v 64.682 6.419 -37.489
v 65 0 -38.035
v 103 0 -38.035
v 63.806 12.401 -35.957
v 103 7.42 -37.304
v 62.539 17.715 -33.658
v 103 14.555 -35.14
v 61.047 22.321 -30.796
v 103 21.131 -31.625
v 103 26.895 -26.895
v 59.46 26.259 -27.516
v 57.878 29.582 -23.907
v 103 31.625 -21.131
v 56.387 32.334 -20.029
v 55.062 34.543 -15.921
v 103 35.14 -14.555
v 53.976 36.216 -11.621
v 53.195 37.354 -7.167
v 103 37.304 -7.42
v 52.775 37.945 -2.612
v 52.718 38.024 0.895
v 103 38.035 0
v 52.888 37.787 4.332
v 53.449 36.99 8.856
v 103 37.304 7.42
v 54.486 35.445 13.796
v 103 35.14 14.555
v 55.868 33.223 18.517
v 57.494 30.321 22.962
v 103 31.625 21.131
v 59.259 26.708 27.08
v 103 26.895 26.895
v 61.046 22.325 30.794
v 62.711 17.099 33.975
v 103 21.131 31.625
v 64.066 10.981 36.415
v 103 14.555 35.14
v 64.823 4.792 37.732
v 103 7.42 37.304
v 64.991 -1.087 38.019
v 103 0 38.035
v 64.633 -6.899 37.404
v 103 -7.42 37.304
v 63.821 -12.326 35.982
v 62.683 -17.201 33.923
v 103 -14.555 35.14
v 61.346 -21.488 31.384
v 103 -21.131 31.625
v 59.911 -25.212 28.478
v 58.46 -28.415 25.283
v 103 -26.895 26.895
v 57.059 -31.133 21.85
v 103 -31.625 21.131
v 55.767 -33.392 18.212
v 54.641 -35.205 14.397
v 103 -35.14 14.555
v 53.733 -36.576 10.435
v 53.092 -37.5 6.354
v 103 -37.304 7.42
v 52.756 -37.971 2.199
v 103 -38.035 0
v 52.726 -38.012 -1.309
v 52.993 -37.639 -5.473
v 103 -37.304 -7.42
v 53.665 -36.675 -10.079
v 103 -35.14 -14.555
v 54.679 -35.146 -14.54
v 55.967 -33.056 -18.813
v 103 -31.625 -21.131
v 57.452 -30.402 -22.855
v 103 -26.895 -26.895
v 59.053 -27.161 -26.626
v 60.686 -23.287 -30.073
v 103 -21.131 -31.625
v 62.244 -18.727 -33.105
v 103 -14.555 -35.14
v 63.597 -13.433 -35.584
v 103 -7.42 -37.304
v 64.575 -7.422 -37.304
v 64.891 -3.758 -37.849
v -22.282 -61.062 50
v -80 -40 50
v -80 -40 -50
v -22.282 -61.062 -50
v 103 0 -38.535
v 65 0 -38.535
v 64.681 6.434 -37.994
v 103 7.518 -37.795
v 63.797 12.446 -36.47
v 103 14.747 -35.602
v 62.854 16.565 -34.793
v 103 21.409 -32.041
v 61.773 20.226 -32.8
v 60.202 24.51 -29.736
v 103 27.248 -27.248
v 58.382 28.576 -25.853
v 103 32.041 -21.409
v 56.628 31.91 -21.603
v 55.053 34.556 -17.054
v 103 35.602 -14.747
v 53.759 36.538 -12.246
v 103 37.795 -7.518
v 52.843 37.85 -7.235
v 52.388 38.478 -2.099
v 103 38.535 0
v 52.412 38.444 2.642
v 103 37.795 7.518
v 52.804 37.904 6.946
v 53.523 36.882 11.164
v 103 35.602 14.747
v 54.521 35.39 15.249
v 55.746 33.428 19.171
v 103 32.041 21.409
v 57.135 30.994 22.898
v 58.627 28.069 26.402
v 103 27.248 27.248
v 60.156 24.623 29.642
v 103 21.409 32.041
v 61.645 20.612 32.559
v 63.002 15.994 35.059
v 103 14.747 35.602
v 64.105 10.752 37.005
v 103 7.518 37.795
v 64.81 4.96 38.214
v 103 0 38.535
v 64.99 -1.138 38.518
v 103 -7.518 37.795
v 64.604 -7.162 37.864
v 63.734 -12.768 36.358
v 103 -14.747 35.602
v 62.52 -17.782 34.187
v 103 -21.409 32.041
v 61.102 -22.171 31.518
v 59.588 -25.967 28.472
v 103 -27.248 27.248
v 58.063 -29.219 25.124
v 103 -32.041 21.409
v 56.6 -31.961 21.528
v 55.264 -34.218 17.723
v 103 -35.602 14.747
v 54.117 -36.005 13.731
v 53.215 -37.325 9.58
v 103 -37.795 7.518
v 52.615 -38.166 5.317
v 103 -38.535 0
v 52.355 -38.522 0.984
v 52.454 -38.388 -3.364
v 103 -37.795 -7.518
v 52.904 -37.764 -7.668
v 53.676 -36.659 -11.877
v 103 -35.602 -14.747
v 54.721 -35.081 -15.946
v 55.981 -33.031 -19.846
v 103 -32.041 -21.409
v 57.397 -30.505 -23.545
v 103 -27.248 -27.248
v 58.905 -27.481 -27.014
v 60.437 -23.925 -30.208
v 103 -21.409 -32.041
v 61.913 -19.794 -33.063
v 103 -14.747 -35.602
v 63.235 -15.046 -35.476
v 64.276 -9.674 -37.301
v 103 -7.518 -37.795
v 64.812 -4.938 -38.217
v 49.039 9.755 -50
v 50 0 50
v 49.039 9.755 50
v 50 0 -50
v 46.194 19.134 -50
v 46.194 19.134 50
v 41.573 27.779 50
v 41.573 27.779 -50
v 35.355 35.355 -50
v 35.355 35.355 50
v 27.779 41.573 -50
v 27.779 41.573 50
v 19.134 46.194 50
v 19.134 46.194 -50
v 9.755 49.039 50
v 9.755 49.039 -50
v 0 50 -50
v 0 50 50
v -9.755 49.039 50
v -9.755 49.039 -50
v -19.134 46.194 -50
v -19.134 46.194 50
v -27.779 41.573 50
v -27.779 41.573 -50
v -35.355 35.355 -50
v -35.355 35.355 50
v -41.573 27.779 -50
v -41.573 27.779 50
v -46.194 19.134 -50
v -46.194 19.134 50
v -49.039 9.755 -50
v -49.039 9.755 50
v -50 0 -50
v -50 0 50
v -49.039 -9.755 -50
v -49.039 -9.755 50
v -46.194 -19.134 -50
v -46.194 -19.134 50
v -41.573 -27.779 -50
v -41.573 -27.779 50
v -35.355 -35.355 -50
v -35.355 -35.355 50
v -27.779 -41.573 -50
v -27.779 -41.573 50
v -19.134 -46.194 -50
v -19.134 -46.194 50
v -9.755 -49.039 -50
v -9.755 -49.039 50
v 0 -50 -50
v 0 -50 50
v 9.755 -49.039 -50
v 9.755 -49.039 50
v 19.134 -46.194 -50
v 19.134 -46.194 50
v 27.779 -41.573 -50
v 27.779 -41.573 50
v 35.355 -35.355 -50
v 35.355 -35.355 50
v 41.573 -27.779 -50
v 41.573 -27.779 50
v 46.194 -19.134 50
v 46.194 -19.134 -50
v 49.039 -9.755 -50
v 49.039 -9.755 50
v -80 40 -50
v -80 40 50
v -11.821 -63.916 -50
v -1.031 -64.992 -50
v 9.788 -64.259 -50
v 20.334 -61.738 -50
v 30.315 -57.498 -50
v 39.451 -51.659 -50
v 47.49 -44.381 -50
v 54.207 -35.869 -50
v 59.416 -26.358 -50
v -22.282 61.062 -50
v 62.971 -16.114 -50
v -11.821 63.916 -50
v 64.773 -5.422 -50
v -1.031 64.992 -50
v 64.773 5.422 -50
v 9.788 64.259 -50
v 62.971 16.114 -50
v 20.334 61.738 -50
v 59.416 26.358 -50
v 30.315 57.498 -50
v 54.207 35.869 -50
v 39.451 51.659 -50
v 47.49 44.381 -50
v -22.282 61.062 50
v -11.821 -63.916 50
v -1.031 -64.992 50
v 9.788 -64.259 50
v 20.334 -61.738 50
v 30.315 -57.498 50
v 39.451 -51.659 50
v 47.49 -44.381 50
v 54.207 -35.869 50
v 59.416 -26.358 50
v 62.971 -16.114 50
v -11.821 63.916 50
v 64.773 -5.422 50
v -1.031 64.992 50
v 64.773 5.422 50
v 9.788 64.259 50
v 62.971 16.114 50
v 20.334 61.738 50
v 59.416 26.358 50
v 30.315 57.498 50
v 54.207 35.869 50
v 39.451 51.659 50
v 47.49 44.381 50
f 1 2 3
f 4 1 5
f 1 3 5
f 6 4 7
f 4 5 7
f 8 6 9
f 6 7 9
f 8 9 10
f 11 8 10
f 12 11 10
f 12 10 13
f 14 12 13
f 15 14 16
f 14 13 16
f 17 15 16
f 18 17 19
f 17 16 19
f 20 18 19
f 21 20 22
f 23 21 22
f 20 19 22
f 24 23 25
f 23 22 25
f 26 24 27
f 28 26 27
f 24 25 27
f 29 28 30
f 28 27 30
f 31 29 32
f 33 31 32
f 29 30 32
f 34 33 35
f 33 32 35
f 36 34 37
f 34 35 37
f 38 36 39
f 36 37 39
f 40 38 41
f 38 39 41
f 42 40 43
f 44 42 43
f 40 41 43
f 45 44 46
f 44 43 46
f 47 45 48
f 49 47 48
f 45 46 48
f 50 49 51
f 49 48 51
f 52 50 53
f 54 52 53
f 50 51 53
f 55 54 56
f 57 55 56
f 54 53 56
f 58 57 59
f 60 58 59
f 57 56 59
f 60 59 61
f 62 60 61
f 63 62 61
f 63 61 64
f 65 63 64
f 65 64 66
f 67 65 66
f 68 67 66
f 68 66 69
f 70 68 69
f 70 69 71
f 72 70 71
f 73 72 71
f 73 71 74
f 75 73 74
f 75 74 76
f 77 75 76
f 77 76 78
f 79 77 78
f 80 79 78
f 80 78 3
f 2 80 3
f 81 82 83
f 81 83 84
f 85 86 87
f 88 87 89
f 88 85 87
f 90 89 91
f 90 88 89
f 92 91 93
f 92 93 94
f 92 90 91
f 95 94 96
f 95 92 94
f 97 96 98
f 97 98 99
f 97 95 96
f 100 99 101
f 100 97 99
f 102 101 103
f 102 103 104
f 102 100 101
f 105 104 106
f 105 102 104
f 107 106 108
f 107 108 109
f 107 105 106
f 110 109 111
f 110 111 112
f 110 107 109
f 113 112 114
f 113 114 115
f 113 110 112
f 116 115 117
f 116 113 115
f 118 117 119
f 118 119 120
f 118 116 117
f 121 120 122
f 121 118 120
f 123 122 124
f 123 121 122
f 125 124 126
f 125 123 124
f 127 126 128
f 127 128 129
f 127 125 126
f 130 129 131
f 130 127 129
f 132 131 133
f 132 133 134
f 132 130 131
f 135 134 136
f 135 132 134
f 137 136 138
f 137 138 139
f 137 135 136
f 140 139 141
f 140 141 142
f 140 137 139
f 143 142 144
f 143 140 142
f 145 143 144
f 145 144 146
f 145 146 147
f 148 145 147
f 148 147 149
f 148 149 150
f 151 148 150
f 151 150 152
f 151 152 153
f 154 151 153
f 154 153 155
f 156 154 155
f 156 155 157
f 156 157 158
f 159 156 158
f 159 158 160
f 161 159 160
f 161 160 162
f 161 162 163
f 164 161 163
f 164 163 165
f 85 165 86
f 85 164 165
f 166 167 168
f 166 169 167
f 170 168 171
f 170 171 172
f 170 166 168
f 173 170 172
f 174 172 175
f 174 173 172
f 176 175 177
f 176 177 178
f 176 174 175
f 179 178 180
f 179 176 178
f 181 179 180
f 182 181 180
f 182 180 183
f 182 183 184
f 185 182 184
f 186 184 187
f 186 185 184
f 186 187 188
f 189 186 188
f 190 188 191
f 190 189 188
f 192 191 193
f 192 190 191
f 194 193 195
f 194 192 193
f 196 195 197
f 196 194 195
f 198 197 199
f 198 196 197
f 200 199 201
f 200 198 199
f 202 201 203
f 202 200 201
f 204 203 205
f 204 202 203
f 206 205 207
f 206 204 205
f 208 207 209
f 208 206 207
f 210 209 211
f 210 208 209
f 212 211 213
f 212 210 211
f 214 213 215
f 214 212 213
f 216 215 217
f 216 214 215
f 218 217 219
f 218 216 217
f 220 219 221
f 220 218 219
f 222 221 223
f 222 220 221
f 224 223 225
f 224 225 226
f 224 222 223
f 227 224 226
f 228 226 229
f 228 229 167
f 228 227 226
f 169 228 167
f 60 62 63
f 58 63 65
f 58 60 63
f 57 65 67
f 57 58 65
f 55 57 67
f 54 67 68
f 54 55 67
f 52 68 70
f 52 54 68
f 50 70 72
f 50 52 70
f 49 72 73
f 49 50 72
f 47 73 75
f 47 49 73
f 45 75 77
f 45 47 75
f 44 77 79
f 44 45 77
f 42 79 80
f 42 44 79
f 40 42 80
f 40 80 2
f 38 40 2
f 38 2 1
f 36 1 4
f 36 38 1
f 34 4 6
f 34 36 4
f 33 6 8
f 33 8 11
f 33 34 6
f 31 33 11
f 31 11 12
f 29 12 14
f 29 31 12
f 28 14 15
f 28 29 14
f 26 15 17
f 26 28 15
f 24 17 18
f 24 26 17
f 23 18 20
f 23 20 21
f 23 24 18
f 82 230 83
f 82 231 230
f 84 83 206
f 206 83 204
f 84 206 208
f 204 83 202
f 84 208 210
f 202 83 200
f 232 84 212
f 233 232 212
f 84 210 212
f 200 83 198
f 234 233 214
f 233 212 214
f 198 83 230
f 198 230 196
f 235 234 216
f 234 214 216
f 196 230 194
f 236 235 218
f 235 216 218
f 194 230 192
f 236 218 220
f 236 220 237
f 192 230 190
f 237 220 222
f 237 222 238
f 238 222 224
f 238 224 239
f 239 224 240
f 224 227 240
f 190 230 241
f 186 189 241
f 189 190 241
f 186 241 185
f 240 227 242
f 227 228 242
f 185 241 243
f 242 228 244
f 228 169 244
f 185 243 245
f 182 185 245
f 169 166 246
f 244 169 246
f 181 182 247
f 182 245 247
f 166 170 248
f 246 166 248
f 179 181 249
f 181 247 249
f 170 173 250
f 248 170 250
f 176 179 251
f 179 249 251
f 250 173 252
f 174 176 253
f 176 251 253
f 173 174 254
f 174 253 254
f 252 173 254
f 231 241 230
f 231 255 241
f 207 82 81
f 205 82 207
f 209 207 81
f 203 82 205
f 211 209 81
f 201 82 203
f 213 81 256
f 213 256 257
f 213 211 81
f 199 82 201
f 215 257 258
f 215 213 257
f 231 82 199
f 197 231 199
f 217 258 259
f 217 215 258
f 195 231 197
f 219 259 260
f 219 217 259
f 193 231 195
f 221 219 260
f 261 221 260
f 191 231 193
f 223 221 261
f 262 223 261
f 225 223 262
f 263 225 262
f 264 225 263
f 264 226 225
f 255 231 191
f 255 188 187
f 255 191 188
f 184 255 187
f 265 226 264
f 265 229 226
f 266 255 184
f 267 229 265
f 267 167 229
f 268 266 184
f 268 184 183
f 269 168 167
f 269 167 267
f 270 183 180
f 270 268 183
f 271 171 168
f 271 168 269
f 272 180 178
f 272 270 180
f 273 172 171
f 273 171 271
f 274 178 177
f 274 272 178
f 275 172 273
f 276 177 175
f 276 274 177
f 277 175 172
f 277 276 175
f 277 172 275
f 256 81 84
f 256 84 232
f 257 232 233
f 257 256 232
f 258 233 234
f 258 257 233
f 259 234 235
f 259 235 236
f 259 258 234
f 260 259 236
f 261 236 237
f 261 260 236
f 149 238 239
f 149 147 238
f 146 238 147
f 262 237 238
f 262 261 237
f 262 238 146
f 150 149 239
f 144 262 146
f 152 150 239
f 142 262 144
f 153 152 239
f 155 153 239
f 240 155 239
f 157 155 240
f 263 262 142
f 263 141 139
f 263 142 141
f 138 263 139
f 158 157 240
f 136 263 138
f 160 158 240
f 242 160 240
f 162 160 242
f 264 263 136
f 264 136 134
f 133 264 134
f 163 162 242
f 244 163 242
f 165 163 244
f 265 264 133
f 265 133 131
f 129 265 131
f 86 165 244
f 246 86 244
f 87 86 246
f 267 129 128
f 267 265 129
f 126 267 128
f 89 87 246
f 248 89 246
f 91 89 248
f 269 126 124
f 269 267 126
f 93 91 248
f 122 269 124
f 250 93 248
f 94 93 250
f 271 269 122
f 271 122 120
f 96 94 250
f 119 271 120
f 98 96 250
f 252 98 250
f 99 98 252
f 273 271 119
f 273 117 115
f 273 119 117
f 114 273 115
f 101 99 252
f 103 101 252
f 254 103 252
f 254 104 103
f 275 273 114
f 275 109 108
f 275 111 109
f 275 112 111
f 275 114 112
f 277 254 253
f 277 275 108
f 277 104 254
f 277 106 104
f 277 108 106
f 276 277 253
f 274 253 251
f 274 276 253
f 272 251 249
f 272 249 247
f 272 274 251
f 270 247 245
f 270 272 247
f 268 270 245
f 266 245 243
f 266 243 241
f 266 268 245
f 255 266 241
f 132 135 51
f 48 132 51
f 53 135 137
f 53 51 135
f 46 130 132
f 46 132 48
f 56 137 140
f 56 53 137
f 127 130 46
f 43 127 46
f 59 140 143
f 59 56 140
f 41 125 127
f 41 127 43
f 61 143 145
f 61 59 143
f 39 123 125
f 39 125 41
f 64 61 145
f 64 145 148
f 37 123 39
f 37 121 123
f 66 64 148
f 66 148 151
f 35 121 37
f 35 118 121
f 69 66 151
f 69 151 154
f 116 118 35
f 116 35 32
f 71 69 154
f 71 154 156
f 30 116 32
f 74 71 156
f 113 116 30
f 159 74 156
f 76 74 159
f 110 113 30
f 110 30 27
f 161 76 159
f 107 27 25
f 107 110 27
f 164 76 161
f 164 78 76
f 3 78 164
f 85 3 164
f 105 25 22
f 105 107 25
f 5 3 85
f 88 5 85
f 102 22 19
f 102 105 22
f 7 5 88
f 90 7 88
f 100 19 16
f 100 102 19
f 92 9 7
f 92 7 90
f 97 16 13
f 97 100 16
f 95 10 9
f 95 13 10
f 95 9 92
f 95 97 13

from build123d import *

# Parameters (mm, degrees)
SKETCH1_R                = 50
BOSS_EXTRUDE1_DEPTH      = 50
BOSS_EXTRUDE2_REACH      = 202.534
BOSS_EXTRUDE2_END_RADIUS = 65
SKETCH2_R                = 38.535
SKETCH2_R_2              = 38.035


with BuildPart() as part:
    # Sketch1 → Boss-Extrude1 (new, symmetric)
    with BuildSketch(Plane.XY):
        with BuildLine():
            Line((-80, 40), (-80, -40))
            Line((-80, -40), (-22.281665693, -61.061668614))
            ThreePointArc((-22.281665693, -61.061668614), (65, 0), (-22.281665693, 61.061668614))
            Line((-22.281665693, 61.061668614), (-80, 40))
        make_face()
        Circle(SKETCH1_R, mode=Mode.SUBTRACT)
    extrude(amount=BOSS_EXTRUDE1_DEPTH, both=True)

    # Boss-Extrude2: up to this cylinder (the profile starts outside it)
    boss_extrude2_end = Plane(origin=(0, 0, 38.426007), z_dir=(0, 0, -1)) * Cylinder(BOSS_EXTRUDE2_END_RADIUS, 536.068, mode=Mode.PRIVATE)
    # Sketch2 → Boss-Extrude2 (add, up to the surface)
    with BuildSketch(Plane(origin=(103, 0, 0), x_dir=(0, 0, -1), z_dir=(1, 0, 0)), mode=Mode.PRIVATE) as boss_extrude2_sk1:
        Circle(SKETCH2_R)
        Circle(SKETCH2_R_2, mode=Mode.SUBTRACT)
    boss_extrude2_tool1 = extrude(boss_extrude2_sk1.sketch, amount=-BOSS_EXTRUDE2_REACH, mode=Mode.PRIVATE) - boss_extrude2_end
    add(boss_extrude2_tool1.solids().sort_by_distance((103, 0, 38.426007))[0])


solid = part.part
